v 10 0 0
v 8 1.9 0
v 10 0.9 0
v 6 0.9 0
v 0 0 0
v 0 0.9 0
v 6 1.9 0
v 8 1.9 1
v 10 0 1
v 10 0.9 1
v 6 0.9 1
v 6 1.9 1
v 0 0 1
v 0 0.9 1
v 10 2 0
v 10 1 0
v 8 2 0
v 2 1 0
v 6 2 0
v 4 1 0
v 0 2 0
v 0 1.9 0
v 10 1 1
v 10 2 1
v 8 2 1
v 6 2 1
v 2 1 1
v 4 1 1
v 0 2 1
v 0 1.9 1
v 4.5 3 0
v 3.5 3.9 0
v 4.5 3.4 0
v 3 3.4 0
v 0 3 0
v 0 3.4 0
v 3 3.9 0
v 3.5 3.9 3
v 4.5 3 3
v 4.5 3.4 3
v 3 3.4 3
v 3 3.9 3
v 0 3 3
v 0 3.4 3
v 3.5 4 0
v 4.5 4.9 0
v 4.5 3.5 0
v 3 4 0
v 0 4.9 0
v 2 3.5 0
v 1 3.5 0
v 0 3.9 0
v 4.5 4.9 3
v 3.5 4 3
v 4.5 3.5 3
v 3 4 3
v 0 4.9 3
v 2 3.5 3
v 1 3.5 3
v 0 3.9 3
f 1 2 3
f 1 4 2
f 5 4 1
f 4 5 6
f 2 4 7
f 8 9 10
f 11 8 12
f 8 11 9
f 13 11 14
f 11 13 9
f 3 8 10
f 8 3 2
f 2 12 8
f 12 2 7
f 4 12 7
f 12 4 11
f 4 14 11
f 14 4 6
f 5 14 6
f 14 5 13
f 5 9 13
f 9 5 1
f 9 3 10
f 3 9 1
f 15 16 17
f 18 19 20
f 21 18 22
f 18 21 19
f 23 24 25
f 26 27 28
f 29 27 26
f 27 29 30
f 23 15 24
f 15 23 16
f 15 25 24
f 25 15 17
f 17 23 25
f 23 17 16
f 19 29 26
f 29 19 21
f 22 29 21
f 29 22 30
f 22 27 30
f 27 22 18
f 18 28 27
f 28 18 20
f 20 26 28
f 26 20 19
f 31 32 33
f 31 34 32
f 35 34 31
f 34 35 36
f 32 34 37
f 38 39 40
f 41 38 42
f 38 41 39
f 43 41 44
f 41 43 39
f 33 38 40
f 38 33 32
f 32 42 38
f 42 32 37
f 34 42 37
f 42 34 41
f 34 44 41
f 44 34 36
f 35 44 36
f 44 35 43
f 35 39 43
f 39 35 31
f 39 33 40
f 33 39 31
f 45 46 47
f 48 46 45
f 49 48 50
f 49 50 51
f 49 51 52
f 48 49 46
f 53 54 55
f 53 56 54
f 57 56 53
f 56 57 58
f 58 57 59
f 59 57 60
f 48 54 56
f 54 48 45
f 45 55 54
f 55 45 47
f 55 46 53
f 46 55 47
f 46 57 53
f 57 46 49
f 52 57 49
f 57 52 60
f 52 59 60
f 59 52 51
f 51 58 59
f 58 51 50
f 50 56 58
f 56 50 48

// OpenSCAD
// file: ../lib/hull.scad
/*
hull.scad - a library that leverages the hull() procedure
Author: Elliot Williams
github: https://gist.github.com/hexagon5un )
source: https://gist.github.com/hexagon5un/73e187dfa0404c69177795424f397ce6#file-hull-scad

Featured in the hackaday atricle: 'OPENSCAD: TIEING IT TOGETHER WITH HULL()'
https://hackaday.com/2018/02/13/openscad-tieing-it-together-with-hull/
*/
module multiHull(){
	for (i = [1 : $children-1])
		hull(){
			children(0);
			children(i);
		}
}

module sequentialHull(){
	for (i = [0: $children-2])
		hull(){
			children(i);
			children(i+1);
		}
}

/* Extended fun hull functions */ 

module cylinders(points, diameter, thickness){
	for (p=points){
		translate(p) cylinder(d=diameter, h=thickness, center=true);
	}
}

module plate(points, diameter, thickness, hole_diameter){
	difference(){
		hull() cylinders(points, diameter, thickness);
		cylinders(points, hole_diameter, 1000);
	}
}

module bar(length, width, thickness, hole_diameter){
	plate([[0,0,0], [length,0,0]], width, thickness, hole_diameter);
}

module rounded_box(points, radius, height, facets=30){
	hull(){
		for (p = points){
			translate(p)
				cylinder(r=radius, h=height, $fn=facets);
		}
	}
}

module point_cloud(points, radius=1, facets=8){
	for (p=points){
		translate(p)
			sphere(radius/cos(180/facets), $fn=facets);
		// polygon sphere circumscribed on radius
	}
}

module point_hull(points, radius=1, facets=8){
	hull(){
		point_cloud(points, radius, facets);
	}
}

// Shrink the exterior of the points so that the hull fits inside
function select(vector, i) = [ for (p=vector) p[i] ];
function axis_center(v, i) = (max(select(v, i)) - min(select(v,i)))/2;
function center(v) = [ for (i = [0,1,2]) axis_center(v, i) ];
function shrink_point(point, center, radius) = [ for (i = [0,1,2]) point[i] > center[i] ? point[i] - radius : point[i] + radius ]; 
function shrink(points, radius) = [ for (p = points) shrink_point(p, center(points), radius) ];

module interior_point_hull(points, radius=1){
	point_hull(shrink(points, radius), radius);
}

module interior_rounded_box(points, radius, height){
	rounded_box(shrink(points, radius), radius, height);
}


module mirror_copy(v = [1, 0, 0]) {
    children();
    mirror(v) children();
}
// file: ../lib/basics.scad
///< Basics module
use <math.scad>;
use <utils.scad>;
use <hull.scad>;

module triangle( w, d, h ){
     difference(){
	  hyp = hyp_from_sides( d, h );
	  color( "red" )cube( [w, d, h] );
	  rotate( [ 45, 0, 0 ] )
	       translate( [ -0.01, 0, 0 ] )
	       color( "green" )cube( [w+0.2, hyp, h] );
     }
}

module tri_xy(pt1, pt2, pt3, h=1) {
     color( rands( 0,1,3 ) ) linear_extrude( height=h )
	  polygon( points=[ pt1, pt2, pt3 ] );
}

module triangle_xy( pts, h=1) {
     color( rands( 0,1,3 ) ) linear_extrude( height=h )
	  polygon( points = pts );
}

module oval(w,l, height, center = false, fn = 30) {
 scale([1, l/w, 1]) cylinder(h=height, r=w, center=center, $fn = fn);
}

module pipe( outer, inner, height, fn = 60 ){
     offset_percent = 0.25;
     inner_h = height + (offset_percent * 2 );
     difference(){
     ///< Debug with union(){
	  cylinder(r=outer, h = height, $fn = fn );
	  translate([0,0,-offset_percent]){
	       color("green",0.5)cylinder(r=inner, h = inner_h, $fn = fn );
	  }
     }
}

module rounded_pipe( r, h, fn = 60 ){
     cylinder(r = r, h = h, $fn = fn );

     color("blue")
     translate([0,0,h])
	  sphere(r, $fn = fn );

     color("red")
     translate([0,0,0])
	  sphere(r, $fn = fn );
}

/// Stackoverflow example module for a line
/// https://stackoverflow.com/questions/49533350/is-that-possible-to-draw-a-line-using-openscad-by-joining-different-points
module line(start, end, thickness = 1, fn = 30) {
    hull() {
	translate(start) sphere(thickness, $fn = fn);
	translate(end) sphere(thickness, $fn = fn);
    }
}


/*
Hulled box:

Parameterized box with rounded corners. This uses the hull.scad
to hull four cylinders around four point in space. This variation
offsets the box to zero/zero and takes in w,d,h to mesh better
with tuples.
*/
module hulled_cube( w, d, h, r = 1 ){
    points = [
	[ 0, 0, 0 ],
	[ w, 0, 0 ],
	[ 0, w, 0 ],
	[ w, w, 0 ],
	];
    resize( [w,d,h]){
	translate( [r, r,0] ){
	    rounded_box( points, radius = r, height=h );
	}
    }
}
// file: nameplate.scad
///< Nameplate
/*
https://en.wikipedia.org/wiki/Nameplate
Excerpt:  'Although office nameplates range in size, the most popular nameplate size is 2 by 8 inches (5.08 cm × 20.32 cm)'

*/
use <../lib/math.scad>;
use <../lib/utils.scad>;

///< Parameters
nameplate_w_inches = 8;
nameplate_h_inches = 2;
nameplate_d_inches = 0.10;

nameplate_w = in2mm( nameplate_w_inches );
nameplate_h = in2mm( nameplate_h_inches );
nameplate_d = in2mm( nameplate_d_inches );

nameplate_debug = false;

if( nameplate_debug ) {
     echo( "Nameplate width: ",  nameplate_w,  "mm" );
     echo( "Nameplate height: ", nameplate_h, "mm" );
     echo( "Nameplate depth: ",  nameplate_d,  "mm" );
}

nameplate = [ nameplate_w, nameplate_d, nameplate_h ];

///< Modules
module Nameplate( size, center = false ) {
     cube( size, center = center );
}
// file: ../lib/utils.scad
///< Utilities

function rand_clr() = rands( 0,1,3 );

///< Length conversions
function in2mm( i ) = ( i * 25.4 ); 
function mm2in( m ) = ( m / 25.4 );

/// This is pulled from stackoverflow
/// https://stackoverflow.com/questions/45826208/openscad-rotating-around-a-particular-point

// rotate as per a, v, but around point pt
module rotate_about_pt(a, v, pt) {
    translate(pt)
        rotate(a,v)
            translate(-pt)
                children();   
}
// file: ../lib/math.scad
///< Math scad module


///< Find the hypotenuse from two sides of a right triangle
function hyp_from_sides( a, b ) = sqrt( pow( a, 2 ) + pow( b, 2 ) );

///< Find equal sides from hypotenuse of a right triangle
function sides_from_hyp(h) = sqrt( pow( h, 2 ) / 2 );

///< Find A from hypotenuse and B
function a_from_hb( h, b ) = sqrt( pow( h, 2 ) - pow( b, 2 ) );

function dist_2d( pt2, pt1 ) = sqrt(pow(( pt2[0]-pt1[0] ),2) + pow(( pt2[1]-pt1[1]),2) );

function mid_pt_2d( pt2, pt1 ) = [( pt1[0]+pt2[0] )/2, ( pt1[1]+pt2[1] )/2, 0 ];
///< Test for math functions

A = 3;
B = 4;
echo("Given A=", A, "and B=", B );
H = hyp_from_sides( A, B );
echo("Hypotenuse=", H );
echo("Calc Correct = ", (H == 5) );

echo("Given H=", H, " which is a hypotenuse with equal sides" );
echo( "the sides=", sides_from_hyp( H ) );

echo("Given H=", H, "B=", 4 );
echo("A=", a_from_hb( H, 4 ) );

echo("Distance from [-1,1] and [3,4] = ", dist_2d( [-1,1],[3,4]) );
// main file
///< Object definition
use <../lib/math.scad>;
use <../lib/utils.scad>;
include<nameplate.scad>;
use <../lib/basics.scad>;

/*
http://fab.cba.mit.edu/classes/S62.12/people/vernelle.noel/Plastic_Snap_fit_design.pdf

Parameters
y= (permissible) deflection (=undercut)
l= length of arm
h= thickness at root
b= width at root
c= distance between outer fiber and neutral fiber (center of gravity)
P= (permissible) deflection force
a= hypot of deflection
*/

thickness = 6.5;

module cantilever( y, h, b, p, a, l = 1, origin = 0, hide = false ){
       points = [
       [ origin,             origin],
       [ origin,             h     ],
       [ origin + b,         h     ],
       [ origin + b,         h + y ],
       [ origin + b + p,     h + y ],
       [ origin + b + p + a, h     ],
       [ origin + b + p + a, origin],
       ];
     if( !hide ){
     linear_extrude( height = l ){ polygon( points ); }
     }
}

module substrate( y, h, b, p, a, l = 1, origin = [0,0], hide = false, sep = 0.25, suby = 1 ){

     points = [
       [ origin[0],                       h + y ],           //< A
       [ origin[0],                       h + y + suby ],    //< B
       [ origin[0] + b + p + a + subx,    h + y + suby ],    //< C
       [ origin[0] + b + p + a + subx,    origin[1] + sep ], //< D
       [ origin[0] + b + p + a + subx,    origin[1] + sep ], //< E
       [ origin[0] + b + p + a + subx,    h + sep ],         //< F
       [ origin[0] + b + p,               h + sep + y ],     //< G
       [ origin[0] + b,                   h + sep + y ],     //< H
       [ origin[0] + b - a,             h + sep ],         //< I
       [ origin[0] + a,                   h + sep ],         //< J
       ];
     if( !hide ){
     linear_extrude( height = l ){ polygon( points ); }
     }
}

module snap_fit_sub( y, h, b, p, a, l = 1, origin = 0, hide = false, sep = 0, suby = 0, subx = 0, hide_sub = false, hide_lever = false ){

     color( "violet")cantilever( y = y, h = h, b = b, p = p, a = a, l = l, hide = hide_lever );
     color( "pink" )substrate(   y = y, h = h, b = b, p = p, a = a, l = l, sep = sep, suby = suby, subx = subx, hide = hide_sub );
}

snap_fit_sub( y = 1, h = 1-0.1, b = 6, p = 2, a = 2, sep = 0.1, suby = 0.1, subx = 0 );

translate( [ 0, 3, 0 ] )snap_fit_sub( y = 0.5, h = 0.5-0.1, b = 3, p = 0.5, a = 1, l = 3, sep = 0.1, suby = 1, subx = 0 );
